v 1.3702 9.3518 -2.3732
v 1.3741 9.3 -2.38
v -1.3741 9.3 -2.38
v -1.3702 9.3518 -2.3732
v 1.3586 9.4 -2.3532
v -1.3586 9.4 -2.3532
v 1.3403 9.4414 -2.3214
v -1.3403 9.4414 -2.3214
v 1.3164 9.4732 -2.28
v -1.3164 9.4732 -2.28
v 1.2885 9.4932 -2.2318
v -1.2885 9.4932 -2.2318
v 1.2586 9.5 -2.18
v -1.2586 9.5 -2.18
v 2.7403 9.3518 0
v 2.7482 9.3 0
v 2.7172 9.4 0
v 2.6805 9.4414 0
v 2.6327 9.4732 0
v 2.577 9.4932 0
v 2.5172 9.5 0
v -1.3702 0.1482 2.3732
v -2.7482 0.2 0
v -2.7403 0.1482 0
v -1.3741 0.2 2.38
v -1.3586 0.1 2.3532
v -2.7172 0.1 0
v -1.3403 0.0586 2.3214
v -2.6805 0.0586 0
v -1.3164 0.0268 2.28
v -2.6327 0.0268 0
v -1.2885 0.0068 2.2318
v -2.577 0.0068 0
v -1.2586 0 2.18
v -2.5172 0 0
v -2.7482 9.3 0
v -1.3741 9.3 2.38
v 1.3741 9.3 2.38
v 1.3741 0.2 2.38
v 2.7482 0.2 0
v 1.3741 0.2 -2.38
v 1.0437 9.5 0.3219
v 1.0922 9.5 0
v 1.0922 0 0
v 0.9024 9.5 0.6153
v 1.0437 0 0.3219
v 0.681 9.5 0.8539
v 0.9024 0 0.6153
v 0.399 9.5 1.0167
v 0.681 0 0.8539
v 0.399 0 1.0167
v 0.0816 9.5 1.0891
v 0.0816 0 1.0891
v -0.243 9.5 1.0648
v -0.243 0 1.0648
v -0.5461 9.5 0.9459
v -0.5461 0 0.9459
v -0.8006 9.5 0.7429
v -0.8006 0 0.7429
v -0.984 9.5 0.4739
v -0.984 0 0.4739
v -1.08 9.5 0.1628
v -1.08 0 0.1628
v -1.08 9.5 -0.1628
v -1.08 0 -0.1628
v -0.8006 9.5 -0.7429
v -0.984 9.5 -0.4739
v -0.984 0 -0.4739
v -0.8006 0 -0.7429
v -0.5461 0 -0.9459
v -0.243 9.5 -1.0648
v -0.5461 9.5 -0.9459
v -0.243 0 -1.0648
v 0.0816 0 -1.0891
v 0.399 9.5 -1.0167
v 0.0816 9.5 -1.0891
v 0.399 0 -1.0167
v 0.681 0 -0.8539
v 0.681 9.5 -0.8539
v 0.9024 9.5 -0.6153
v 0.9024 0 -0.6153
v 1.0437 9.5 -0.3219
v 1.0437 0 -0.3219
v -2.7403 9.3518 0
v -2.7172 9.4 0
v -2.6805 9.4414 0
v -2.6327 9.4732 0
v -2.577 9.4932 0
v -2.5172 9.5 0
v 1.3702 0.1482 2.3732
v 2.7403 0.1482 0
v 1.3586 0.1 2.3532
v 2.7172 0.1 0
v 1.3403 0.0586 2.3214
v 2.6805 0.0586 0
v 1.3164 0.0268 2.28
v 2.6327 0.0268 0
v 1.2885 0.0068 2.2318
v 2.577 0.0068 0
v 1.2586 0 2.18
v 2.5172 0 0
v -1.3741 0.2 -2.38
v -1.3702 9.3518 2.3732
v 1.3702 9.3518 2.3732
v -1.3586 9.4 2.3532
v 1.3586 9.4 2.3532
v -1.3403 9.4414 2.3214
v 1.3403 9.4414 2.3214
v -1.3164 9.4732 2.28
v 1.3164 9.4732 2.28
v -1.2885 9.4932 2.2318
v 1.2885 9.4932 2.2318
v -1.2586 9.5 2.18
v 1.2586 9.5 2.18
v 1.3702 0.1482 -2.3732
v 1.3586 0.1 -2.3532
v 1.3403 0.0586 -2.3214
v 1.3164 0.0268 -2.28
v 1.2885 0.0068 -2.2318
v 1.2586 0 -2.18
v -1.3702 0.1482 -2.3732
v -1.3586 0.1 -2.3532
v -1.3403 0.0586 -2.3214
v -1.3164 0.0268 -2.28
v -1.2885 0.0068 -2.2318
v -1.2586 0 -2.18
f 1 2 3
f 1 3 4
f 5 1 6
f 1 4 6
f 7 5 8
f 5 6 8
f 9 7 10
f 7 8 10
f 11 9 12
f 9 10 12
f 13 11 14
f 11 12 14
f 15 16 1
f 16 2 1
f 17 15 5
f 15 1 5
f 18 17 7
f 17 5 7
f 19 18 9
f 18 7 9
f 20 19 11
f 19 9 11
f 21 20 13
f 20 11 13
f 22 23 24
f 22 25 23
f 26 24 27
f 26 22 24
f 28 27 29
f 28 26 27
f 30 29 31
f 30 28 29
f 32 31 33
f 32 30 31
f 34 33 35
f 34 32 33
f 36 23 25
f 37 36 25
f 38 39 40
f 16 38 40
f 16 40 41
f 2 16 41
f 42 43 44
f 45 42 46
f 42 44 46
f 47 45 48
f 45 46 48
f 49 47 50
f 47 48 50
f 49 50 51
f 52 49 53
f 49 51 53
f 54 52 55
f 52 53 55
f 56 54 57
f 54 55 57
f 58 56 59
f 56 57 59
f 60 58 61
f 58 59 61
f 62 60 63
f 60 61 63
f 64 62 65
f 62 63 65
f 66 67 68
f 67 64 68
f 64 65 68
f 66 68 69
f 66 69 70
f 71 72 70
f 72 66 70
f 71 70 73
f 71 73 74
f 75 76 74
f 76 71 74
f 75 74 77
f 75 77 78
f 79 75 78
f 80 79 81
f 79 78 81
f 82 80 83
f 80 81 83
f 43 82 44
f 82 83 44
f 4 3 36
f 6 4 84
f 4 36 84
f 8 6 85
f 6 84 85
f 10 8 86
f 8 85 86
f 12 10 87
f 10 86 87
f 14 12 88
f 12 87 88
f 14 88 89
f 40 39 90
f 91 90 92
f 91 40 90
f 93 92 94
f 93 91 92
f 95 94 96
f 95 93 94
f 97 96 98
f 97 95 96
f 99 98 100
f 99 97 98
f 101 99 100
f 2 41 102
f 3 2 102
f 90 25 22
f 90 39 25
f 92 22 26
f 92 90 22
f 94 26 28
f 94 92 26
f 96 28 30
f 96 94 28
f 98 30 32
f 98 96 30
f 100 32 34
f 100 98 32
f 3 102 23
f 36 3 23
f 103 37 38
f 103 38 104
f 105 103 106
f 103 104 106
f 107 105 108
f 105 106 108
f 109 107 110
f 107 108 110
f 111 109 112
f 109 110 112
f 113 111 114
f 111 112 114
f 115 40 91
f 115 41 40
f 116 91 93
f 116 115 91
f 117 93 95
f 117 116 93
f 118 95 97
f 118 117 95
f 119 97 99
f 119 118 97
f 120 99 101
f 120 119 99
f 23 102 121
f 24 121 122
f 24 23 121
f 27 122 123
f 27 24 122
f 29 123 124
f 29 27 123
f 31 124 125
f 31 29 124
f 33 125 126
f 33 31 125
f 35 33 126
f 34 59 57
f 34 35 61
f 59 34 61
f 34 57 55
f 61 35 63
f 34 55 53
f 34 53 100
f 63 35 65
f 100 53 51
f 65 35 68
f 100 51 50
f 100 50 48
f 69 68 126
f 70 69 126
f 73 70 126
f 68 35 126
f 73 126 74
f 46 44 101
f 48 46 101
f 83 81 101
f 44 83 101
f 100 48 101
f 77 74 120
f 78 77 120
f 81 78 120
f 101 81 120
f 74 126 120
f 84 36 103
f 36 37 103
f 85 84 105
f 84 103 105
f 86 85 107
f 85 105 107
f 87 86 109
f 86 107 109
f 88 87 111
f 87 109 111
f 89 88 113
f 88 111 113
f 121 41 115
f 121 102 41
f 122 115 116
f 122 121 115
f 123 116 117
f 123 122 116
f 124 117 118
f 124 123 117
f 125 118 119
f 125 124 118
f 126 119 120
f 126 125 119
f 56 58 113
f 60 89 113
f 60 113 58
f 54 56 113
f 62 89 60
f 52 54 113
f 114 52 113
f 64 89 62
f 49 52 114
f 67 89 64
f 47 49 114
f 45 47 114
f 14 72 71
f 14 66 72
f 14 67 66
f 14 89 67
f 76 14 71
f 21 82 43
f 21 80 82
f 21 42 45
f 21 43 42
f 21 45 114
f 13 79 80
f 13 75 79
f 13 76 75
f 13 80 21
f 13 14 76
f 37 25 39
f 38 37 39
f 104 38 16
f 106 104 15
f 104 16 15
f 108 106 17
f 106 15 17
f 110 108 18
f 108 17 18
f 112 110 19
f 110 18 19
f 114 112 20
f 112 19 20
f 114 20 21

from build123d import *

# Parameters (mm, degrees)
RESSALTO_EXTRUS_O1_DEPTH = 9.5
FILETE1_R                = 0.2
ESBO_O3_R                = 1.0922
CORTE_EXTRUS_O1_DEPTH    = 4.76
ESBO_O2_R                = 1.0922
CORTE_EXTRUS_O2_DEPTH    = 10.5


with BuildPart() as part:
    # Esboço1 → Ressalto-extrusão1 (new body)
    with BuildSketch(Plane(origin=(0, 0, 0), x_dir=(1, 0, 0), z_dir=(0, 1, 0))):
        Polygon((2.748187281, 0), (1.374093641, 2.38), (-1.374093641, 2.38), (-2.748187281, 0), (-1.374093641, -2.38), (1.374093641, -2.38), align=None)
    extrude(amount=RESSALTO_EXTRUS_O1_DEPTH)

    # Filete1
    filete1_edges = [part.edges().sort_by_distance(p)[0] for p in [
        (0, 9.5, -2.38),
        (-2.061140461, 9.5, -1.19),
        (-2.061140461, 9.5, 1.19),
        (0, 9.5, 2.38),
        (2.061140461, 9.5, 1.19),
        (0, 0, 2.38),
        (-2.061140461, 0, 1.19),
        (-2.061140461, 0, -1.19),
        (2.061140461, 9.5, -1.19),
        (0, 0, -2.38),
        (2.061140461, 0, -1.19),
        (2.061140461, 0, 1.19),
    ]]
    fillet(filete1_edges, radius=FILETE1_R)

    # Esboço3 → Corte-extrusão1 (cut)
    with BuildSketch(Plane(origin=(0, 9.5, 0), x_dir=(1, 0, 0), z_dir=(0, 1, 0))):
        Circle(ESBO_O3_R)
    extrude(amount=-CORTE_EXTRUS_O1_DEPTH, mode=Mode.SUBTRACT)

    # Esboço2 → Corte-extrusão2 (cut, through all)
    with BuildSketch(Plane.XZ):
        Circle(ESBO_O2_R)
    extrude(amount=-CORTE_EXTRUS_O2_DEPTH, mode=Mode.SUBTRACT)


solid = part.part
